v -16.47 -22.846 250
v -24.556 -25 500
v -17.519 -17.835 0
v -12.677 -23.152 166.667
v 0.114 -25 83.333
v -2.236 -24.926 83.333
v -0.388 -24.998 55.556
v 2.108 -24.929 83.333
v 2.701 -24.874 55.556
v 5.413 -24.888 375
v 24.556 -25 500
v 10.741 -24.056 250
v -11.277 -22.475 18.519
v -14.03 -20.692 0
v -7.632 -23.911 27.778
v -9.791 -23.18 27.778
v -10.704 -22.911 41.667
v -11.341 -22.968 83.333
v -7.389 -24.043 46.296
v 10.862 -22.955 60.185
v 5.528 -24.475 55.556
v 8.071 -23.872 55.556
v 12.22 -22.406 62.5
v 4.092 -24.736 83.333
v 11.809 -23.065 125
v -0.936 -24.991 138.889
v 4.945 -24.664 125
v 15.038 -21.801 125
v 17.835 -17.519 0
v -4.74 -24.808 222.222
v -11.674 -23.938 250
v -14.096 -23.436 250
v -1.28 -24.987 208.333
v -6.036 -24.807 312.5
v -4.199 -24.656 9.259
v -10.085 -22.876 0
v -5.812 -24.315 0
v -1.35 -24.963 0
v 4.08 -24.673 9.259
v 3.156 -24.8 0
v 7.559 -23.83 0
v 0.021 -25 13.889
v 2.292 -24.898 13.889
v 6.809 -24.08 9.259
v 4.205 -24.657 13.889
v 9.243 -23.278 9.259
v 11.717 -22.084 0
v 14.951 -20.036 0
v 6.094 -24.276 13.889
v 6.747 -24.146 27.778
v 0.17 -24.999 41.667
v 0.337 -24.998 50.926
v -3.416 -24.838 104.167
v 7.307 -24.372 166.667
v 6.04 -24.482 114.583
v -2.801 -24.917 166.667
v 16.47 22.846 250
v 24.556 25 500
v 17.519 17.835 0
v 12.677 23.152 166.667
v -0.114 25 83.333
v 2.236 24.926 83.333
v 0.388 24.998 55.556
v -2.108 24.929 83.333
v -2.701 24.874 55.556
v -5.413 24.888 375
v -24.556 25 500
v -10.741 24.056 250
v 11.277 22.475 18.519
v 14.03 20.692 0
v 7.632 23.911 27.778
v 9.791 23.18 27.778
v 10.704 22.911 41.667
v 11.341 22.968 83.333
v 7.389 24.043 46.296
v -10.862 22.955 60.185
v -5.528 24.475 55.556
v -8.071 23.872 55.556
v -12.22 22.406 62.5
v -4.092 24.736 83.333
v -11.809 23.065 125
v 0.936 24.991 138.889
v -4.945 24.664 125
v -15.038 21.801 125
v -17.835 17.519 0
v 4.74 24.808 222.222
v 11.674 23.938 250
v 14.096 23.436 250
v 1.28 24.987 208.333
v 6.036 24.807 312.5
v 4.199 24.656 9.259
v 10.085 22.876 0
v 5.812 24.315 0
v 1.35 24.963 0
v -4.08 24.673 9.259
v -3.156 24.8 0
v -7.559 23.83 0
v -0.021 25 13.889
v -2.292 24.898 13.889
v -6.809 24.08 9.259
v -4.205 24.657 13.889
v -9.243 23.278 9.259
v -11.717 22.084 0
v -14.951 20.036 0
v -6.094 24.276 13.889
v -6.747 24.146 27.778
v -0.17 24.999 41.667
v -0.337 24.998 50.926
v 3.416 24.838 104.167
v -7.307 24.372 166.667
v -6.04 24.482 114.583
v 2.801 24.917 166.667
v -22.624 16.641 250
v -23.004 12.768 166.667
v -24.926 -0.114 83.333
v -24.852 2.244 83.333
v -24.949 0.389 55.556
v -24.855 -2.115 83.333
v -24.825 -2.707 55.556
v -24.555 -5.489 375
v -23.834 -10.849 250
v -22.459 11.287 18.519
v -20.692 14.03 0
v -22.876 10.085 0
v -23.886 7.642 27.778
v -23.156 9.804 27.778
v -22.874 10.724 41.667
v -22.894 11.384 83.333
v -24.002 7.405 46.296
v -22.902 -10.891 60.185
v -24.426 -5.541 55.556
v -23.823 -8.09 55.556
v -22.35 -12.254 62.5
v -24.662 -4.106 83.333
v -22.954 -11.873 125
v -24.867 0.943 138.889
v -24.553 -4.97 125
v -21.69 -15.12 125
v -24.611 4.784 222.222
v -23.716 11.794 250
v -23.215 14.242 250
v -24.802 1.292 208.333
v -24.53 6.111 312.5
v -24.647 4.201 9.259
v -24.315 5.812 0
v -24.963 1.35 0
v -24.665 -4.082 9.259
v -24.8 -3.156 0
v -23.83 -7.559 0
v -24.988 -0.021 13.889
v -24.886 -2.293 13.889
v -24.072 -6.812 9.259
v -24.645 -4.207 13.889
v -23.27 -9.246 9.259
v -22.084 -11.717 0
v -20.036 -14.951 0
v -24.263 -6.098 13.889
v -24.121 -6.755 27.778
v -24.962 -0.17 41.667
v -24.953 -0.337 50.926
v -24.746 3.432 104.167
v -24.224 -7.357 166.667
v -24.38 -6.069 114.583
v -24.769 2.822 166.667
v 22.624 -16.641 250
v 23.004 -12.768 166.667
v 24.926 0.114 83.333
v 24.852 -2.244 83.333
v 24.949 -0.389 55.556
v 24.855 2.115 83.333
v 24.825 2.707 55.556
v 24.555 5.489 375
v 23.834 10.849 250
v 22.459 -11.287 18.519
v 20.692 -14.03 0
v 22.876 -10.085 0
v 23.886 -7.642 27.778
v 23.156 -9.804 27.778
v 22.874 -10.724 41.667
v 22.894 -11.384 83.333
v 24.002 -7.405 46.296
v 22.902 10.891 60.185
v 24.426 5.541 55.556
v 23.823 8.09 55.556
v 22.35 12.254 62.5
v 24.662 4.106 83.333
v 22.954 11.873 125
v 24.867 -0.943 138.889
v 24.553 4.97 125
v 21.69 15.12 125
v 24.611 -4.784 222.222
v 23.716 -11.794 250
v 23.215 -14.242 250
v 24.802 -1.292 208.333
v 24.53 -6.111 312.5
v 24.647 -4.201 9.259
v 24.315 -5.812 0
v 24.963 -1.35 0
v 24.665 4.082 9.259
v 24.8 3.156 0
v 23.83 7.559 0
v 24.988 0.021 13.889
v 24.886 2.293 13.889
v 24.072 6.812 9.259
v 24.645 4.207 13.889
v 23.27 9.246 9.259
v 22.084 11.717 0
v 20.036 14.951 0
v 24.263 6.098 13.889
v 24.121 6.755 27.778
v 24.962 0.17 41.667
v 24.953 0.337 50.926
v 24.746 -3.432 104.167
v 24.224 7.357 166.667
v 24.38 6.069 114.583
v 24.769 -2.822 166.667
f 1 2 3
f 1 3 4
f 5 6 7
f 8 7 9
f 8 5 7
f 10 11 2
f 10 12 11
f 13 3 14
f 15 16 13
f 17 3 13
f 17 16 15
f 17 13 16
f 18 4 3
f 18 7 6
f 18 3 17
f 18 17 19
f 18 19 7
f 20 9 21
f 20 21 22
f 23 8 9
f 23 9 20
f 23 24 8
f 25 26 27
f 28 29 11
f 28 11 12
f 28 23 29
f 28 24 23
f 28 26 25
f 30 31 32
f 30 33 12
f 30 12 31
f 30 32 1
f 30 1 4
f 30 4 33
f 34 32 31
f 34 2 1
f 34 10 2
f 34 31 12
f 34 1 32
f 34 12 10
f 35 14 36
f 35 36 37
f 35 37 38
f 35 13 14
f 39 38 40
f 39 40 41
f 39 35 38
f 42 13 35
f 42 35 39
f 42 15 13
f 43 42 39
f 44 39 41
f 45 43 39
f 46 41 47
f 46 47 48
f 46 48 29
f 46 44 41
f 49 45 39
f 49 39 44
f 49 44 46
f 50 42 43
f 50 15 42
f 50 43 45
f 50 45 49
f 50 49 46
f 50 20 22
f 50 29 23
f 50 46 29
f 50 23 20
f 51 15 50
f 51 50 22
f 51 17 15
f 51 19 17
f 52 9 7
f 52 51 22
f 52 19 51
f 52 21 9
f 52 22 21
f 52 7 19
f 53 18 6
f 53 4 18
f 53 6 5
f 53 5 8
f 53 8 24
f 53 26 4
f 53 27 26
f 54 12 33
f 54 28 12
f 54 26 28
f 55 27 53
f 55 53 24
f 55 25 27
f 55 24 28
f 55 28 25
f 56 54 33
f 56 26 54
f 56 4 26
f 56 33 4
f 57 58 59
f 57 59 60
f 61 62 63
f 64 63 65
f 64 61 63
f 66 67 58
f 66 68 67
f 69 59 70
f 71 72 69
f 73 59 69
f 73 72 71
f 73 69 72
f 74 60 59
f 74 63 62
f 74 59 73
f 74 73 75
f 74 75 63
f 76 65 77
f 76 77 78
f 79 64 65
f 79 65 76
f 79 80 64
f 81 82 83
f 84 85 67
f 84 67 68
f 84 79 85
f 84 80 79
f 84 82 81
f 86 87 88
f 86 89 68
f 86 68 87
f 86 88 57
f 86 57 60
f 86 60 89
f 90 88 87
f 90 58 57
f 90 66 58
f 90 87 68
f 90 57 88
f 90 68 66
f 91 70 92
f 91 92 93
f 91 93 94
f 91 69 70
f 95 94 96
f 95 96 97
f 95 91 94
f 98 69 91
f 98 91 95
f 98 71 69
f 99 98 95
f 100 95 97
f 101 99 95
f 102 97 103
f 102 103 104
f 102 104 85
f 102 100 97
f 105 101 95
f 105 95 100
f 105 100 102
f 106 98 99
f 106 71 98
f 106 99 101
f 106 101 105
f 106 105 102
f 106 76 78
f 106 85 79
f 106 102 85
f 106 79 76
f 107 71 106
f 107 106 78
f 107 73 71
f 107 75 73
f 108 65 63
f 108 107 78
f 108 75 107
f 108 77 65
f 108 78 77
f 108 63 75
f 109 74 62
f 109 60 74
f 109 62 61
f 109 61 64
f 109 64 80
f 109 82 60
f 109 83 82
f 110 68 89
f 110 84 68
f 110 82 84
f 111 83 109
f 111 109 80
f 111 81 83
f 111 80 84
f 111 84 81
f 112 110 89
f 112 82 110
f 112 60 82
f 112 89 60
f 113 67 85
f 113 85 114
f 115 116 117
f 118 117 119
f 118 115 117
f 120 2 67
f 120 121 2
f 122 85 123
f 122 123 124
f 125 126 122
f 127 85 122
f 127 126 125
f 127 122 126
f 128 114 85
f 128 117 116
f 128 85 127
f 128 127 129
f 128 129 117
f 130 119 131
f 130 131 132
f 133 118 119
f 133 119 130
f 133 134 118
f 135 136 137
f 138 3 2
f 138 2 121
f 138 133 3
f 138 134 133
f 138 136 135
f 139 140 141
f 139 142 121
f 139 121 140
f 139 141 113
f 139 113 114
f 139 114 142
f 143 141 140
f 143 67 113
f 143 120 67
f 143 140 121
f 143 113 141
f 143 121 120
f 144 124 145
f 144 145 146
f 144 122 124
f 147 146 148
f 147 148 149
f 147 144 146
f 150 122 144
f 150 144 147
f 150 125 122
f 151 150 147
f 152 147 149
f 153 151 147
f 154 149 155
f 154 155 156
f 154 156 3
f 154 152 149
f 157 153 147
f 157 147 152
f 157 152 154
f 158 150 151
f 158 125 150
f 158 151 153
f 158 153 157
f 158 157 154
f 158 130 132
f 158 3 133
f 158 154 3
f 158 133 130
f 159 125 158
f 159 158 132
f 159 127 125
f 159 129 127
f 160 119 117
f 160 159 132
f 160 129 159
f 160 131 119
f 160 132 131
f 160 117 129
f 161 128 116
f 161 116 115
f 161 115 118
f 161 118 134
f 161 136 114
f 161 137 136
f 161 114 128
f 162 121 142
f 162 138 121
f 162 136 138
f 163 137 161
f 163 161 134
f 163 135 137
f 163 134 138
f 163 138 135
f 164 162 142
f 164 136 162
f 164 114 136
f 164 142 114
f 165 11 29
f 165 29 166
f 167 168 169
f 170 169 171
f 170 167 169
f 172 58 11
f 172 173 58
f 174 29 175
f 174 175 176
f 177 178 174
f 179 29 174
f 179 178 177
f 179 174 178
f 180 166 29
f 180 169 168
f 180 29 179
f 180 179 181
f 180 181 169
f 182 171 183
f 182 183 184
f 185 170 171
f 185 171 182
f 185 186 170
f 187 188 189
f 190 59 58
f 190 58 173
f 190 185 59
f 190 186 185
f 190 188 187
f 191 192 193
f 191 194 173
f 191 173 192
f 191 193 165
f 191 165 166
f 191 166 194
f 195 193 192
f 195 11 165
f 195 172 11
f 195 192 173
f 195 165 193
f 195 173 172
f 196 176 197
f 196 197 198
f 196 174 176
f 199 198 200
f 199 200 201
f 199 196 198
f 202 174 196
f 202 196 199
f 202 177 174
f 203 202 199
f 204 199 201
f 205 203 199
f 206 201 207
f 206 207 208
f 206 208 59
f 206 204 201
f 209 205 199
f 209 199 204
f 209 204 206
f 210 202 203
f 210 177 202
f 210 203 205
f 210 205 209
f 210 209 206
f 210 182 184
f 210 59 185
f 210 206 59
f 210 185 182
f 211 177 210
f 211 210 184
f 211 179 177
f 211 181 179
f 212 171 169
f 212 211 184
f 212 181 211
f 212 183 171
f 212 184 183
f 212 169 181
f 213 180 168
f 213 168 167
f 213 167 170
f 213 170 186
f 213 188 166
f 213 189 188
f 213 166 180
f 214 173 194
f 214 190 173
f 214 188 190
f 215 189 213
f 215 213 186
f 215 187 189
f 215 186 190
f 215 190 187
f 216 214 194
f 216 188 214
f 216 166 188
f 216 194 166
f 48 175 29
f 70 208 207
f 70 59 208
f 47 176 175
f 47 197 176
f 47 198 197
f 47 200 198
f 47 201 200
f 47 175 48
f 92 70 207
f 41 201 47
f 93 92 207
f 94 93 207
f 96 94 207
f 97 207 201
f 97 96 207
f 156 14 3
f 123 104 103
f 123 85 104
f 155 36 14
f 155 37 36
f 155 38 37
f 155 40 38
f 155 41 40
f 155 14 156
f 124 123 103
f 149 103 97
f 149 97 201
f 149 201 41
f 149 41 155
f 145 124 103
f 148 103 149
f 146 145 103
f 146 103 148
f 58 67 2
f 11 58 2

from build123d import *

# Parameters (mm, degrees)
F0_W     = 50
F0_H     = 50
F1_DEPTH = 500
F5_W     = 49.1124280814
F5_H     = 50


# Not quite as in the source:
# - the arcs of a loft's sections are written as splines that run evenly, so that the points pair up as in the source's solid


with BuildPart() as f1:
    # F0 (on Top) → F1 (new body)
    with BuildSketch(Plane.XY):
        with Locations((-40.0555571541, -0.6388908335)):
            Rectangle(F0_W, F0_H)
    extrude(amount=F1_DEPTH)


with BuildPart() as f6:
    # F3 (on Top) → F6 section 0
    with BuildSketch(Plane.XY):
        with BuildLine():
            add(Edge.make_bspline(
                [(17.5186599633, 17.8352615088), (16.3513448273, 18.9818551222), (15.0711317337, 20.0134527208), (12.3339820931, 21.8071132264), (10.8771132275, 22.5691317816), (7.8426313441, 23.7943361988), (6.2650933599, 24.2574917651), (3.0498926708, 24.8671561751), (1.412309468, 25.0136499437), (-1.8600516675, 24.9843452853), (-3.4947486847, 24.8085475829), (-6.6985152634, 24.1414000176), (-8.2675056054, 23.6500666512), (-11.2795586742, 22.3707142858), (-12.7225469221, 21.5827269212), (-15.4271349709, 19.7403345496), (-16.6886678955, 18.6859750994), (-17.8352615088, 17.5186599633)],
                knots=[0, 0, 0, 0, 0.125, 0.125, 0.25, 0.25, 0.375, 0.375, 0.5, 0.5, 0.625, 0.625, 0.75, 0.75, 0.875, 0.875, 1, 1, 1, 1], degree=3))
            add(Edge.make_bspline(
                [(-17.8352615088, 17.5186599633), (-18.9818551222, 16.3513448273), (-20.0134527208, 15.0711317337), (-21.8071132264, 12.3339820931), (-22.5691317816, 10.8771132275), (-23.7943361988, 7.8426313441), (-24.2574917651, 6.2650933599), (-24.8671561751, 3.0498926708), (-25.0136499437, 1.412309468), (-24.9843452853, -1.8600516675), (-24.8085475829, -3.4947486847), (-24.1414000176, -6.6985152634), (-23.6500666512, -8.2675056054), (-22.3707142858, -11.2795586742), (-21.5827269212, -12.7225469221), (-19.7403345496, -15.4271349709), (-18.6859750994, -16.6886678955), (-17.5186599633, -17.8352615088)],
                knots=[0, 0, 0, 0, 0.125, 0.125, 0.25, 0.25, 0.375, 0.375, 0.5, 0.5, 0.625, 0.625, 0.75, 0.75, 0.875, 0.875, 1, 1, 1, 1], degree=3))
            add(Edge.make_bspline(
                [(-17.5186599633, -17.8352615088), (-16.3513448273, -18.9818551222), (-15.0711317337, -20.0134527208), (-12.3339820931, -21.8071132264), (-10.8771132275, -22.5691317816), (-7.8426313441, -23.7943361988), (-6.2650933599, -24.2574917651), (-3.0498926708, -24.8671561751), (-1.412309468, -25.0136499437), (1.8600516675, -24.9843452853), (3.4947486847, -24.8085475829), (6.6985152634, -24.1414000176), (8.2675056054, -23.6500666512), (11.2795586742, -22.3707142858), (12.7225469221, -21.5827269212), (15.4271349709, -19.7403345496), (16.6886678955, -18.6859750994), (17.8352615088, -17.5186599633)],
                knots=[0, 0, 0, 0, 0.125, 0.125, 0.25, 0.25, 0.375, 0.375, 0.5, 0.5, 0.625, 0.625, 0.75, 0.75, 0.875, 0.875, 1, 1, 1, 1], degree=3))
            add(Edge.make_bspline(
                [(17.8352615088, -17.5186599633), (18.9818551222, -16.3513448273), (20.0134527208, -15.0711317337), (21.8071132264, -12.3339820931), (22.5691317816, -10.8771132275), (23.7943361988, -7.8426313441), (24.2574917651, -6.2650933599), (24.8671561751, -3.0498926708), (25.0136499437, -1.412309468), (24.9843452853, 1.8600516675), (24.8085475829, 3.4947486847), (24.1414000176, 6.6985152634), (23.6500666512, 8.2675056054), (22.3707142858, 11.2795586742), (21.5827269212, 12.7225469221), (19.7403345496, 15.4271349709), (18.6859750994, 16.6886678955), (17.5186599633, 17.8352615088)],
                knots=[0, 0, 0, 0, 0.125, 0.125, 0.25, 0.25, 0.375, 0.375, 0.5, 0.5, 0.625, 0.625, 0.75, 0.75, 0.875, 0.875, 1, 1, 1, 1], degree=3))
        make_face()
    # F5 (on offset) → F6 section 1
    with BuildSketch(Plane.XY.offset(500)):
        Rectangle(F5_W, F5_H)
    loft(ruled=True)


solid = f6.part
